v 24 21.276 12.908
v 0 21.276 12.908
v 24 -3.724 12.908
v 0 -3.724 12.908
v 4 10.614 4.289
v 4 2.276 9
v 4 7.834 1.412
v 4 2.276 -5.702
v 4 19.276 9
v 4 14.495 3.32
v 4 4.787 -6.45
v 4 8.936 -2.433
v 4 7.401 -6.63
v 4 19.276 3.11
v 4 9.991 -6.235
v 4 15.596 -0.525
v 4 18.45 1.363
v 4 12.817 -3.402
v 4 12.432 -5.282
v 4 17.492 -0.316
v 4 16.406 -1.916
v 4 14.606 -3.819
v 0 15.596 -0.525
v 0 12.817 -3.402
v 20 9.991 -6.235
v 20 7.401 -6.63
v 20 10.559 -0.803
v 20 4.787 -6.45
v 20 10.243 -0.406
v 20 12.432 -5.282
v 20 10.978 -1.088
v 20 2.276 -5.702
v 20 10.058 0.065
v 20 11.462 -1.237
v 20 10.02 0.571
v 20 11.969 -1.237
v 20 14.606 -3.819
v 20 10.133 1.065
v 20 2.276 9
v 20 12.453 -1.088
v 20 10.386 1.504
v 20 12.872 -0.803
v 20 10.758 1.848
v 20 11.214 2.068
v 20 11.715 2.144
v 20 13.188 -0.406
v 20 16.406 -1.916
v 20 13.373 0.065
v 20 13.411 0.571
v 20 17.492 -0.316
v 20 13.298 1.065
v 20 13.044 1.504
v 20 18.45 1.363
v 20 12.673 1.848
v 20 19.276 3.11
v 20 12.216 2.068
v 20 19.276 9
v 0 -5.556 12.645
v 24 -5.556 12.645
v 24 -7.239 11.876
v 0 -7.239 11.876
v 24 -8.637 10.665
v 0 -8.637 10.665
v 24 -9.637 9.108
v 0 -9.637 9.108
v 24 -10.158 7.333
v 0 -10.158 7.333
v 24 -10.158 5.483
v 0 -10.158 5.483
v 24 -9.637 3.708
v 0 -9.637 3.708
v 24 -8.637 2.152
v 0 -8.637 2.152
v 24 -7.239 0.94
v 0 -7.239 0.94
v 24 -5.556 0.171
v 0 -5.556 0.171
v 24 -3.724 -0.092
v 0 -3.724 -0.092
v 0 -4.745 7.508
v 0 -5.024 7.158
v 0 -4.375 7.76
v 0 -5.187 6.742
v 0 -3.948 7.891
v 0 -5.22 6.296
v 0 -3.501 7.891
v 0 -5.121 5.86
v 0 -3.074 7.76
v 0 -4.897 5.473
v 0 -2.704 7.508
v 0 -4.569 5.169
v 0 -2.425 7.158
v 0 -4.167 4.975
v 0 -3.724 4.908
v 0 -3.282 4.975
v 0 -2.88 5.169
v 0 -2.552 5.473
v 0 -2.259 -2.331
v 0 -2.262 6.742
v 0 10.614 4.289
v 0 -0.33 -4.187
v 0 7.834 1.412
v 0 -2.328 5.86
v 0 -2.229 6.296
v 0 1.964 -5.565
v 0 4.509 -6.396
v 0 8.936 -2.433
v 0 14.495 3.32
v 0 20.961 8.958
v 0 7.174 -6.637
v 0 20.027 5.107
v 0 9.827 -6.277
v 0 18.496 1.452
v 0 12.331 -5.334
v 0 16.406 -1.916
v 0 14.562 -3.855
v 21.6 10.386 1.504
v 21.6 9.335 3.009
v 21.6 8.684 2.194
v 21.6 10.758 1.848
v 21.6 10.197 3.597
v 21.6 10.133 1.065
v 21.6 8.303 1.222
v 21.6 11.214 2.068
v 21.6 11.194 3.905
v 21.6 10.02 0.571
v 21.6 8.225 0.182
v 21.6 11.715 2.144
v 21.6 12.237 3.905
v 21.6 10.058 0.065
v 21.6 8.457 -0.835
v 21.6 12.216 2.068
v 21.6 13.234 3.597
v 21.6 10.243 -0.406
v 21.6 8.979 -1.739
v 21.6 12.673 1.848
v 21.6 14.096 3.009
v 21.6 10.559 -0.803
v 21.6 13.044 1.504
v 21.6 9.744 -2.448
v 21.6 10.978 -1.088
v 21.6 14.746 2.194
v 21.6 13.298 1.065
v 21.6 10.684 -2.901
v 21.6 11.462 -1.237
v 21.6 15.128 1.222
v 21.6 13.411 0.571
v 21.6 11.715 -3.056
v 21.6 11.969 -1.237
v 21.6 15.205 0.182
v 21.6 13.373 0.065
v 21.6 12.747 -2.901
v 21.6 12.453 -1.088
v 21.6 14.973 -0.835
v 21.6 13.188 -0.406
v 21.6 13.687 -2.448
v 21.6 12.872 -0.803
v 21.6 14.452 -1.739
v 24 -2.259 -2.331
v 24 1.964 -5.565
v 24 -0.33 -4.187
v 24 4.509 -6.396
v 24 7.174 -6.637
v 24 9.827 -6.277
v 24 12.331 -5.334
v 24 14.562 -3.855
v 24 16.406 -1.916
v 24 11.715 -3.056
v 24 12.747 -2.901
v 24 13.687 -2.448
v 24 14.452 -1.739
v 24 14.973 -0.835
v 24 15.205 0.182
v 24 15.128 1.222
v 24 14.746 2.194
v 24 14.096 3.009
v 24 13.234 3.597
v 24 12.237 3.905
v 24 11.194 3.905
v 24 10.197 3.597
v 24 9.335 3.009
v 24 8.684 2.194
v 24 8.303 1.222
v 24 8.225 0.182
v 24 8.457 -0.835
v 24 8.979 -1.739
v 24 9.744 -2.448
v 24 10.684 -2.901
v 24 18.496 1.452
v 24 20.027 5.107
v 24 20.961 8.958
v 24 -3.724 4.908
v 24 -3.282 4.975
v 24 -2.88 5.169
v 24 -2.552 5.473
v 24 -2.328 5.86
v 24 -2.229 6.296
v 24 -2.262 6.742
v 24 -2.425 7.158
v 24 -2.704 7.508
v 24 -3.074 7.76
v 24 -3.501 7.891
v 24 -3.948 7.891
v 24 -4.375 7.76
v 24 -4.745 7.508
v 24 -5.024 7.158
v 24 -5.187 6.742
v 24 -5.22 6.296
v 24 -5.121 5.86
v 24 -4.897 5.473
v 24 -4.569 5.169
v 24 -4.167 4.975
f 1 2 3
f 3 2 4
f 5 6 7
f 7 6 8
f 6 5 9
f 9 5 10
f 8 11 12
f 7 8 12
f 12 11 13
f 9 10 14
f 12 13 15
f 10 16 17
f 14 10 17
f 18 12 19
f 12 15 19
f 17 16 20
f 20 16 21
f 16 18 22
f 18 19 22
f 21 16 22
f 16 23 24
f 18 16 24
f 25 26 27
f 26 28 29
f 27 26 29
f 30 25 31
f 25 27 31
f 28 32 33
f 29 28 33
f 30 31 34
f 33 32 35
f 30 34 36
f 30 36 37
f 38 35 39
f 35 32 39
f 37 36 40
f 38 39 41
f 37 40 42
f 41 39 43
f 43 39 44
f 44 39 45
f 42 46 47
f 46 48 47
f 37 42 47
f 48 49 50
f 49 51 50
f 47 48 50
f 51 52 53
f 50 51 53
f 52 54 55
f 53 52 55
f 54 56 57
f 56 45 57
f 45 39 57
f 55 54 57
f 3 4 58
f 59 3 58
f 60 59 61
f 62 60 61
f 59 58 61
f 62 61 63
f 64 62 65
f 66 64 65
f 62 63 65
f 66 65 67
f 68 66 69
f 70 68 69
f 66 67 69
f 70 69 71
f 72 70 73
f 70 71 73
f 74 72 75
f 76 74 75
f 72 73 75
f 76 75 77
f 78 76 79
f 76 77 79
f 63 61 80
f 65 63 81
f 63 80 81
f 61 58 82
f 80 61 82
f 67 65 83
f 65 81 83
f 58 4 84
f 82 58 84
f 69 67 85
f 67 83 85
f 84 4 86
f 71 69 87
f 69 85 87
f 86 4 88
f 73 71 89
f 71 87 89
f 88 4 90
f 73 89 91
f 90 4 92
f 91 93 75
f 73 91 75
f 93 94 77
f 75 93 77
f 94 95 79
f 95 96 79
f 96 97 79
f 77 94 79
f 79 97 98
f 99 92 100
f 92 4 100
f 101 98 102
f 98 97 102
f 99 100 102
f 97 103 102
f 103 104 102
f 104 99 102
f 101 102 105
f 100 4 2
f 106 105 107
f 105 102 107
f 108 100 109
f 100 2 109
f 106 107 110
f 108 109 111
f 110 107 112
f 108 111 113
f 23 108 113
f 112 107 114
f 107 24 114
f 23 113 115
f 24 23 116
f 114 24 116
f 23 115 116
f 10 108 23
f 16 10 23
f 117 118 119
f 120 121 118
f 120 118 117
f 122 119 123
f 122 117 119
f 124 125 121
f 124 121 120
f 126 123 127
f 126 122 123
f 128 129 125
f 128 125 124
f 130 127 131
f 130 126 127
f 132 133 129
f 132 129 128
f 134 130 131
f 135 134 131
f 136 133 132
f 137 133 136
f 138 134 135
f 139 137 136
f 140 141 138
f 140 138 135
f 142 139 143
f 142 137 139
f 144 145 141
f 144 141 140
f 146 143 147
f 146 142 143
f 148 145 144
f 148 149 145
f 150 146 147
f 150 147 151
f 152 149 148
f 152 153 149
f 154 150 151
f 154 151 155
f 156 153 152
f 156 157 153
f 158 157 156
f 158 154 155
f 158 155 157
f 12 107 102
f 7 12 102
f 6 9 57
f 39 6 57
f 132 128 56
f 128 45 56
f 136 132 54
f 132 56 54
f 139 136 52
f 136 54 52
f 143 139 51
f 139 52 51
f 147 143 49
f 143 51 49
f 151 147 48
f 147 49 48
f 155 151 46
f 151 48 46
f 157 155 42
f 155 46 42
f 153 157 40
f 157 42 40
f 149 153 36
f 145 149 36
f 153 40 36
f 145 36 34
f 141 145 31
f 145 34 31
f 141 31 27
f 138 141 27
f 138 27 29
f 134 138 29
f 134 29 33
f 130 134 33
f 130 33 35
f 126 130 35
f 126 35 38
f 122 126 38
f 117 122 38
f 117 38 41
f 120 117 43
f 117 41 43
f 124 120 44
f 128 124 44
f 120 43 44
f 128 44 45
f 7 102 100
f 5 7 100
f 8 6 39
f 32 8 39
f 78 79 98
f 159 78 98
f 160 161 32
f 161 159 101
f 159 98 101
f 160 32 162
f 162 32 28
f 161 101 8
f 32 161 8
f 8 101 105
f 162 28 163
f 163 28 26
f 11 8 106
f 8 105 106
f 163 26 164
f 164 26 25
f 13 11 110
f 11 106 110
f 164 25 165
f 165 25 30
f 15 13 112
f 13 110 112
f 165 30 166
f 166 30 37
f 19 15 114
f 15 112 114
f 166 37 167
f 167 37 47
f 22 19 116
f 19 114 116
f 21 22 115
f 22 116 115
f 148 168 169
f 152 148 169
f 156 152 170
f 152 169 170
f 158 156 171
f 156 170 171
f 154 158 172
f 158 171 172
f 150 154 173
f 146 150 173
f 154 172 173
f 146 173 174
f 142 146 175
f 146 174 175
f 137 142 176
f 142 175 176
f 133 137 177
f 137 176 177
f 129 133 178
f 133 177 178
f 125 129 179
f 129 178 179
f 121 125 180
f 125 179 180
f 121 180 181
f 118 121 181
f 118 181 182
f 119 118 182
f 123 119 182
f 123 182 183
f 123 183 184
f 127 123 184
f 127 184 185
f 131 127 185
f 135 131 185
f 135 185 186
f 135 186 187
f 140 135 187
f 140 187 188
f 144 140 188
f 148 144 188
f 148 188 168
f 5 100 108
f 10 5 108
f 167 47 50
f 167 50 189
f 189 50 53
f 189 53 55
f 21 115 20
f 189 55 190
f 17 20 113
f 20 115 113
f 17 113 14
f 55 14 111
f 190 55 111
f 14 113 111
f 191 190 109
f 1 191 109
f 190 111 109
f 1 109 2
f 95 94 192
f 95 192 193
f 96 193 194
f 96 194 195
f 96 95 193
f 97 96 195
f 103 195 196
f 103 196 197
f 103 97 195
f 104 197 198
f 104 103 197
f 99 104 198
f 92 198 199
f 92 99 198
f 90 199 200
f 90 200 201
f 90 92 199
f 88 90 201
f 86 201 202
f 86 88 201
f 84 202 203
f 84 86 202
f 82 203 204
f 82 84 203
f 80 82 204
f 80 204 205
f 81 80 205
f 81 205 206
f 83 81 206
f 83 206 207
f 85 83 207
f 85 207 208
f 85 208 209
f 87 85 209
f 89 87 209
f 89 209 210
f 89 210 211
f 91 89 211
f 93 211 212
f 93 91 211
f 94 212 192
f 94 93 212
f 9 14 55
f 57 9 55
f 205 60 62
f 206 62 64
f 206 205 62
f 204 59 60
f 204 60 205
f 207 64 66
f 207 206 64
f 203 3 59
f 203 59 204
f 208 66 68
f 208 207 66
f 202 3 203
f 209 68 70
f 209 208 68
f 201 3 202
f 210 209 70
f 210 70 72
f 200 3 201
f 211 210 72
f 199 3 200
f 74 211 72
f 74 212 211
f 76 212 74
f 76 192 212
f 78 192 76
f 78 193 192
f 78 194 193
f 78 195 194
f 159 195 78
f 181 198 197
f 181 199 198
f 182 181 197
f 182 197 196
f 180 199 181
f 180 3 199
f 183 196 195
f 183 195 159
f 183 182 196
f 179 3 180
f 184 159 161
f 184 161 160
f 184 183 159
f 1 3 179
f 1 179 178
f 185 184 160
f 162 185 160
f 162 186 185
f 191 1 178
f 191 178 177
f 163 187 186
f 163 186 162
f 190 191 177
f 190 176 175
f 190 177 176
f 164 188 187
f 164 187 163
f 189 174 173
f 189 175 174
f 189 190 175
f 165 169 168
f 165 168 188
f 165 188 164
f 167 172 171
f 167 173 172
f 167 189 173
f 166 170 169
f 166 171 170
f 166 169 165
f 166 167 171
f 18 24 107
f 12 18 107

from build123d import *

# Parameters (mm, degrees)
SZKIC5_R                                             = 1.5
DODANIE_WYCI_GNI_CIE2_DEPTH                          = 24
POG_BIENIE_WALCOWE_POD_M3_WKR_T_DO_CZ_CI_D           = 3.4
POG_BIENIE_WALCOWE_POD_M3_WKR_T_DO_CZ_CI_CBORE_D     = 7
POG_BIENIE_WALCOWE_POD_M3_WKR_T_DO_CZ_CI_CBORE_DEPTH = 2.4
SZKIC14_W                                            = 16
SZKIC14_H                                            = 17
WYTNIJ_WYCI_GNI_CIE1_DEPTH                           = 9
WYTNIJ_WYCI_GNI_CIE1_DEPTH_BACK                      = 24
WYTNIJ_WYCI_GNI_CIE2_DEPTH                           = 8


with BuildPart() as part:
    # Szkic5 → Dodanie-wyciągnięcie2 (new body)
    with BuildSketch(Plane(origin=(0, 0, 0), x_dir=(0, 0, -1), z_dir=(1, 0, 0))):
        with BuildLine():
            Line((-12.908163265, 21.275510204), (-12.908163265, -3.724489796))
            ThreePointArc((-12.908163265, -3.724489796), (-6.408163265, -10.224489796), (0.091836735, -3.724489796))
            ThreePointArc((0.091836735, -3.724489796), (6.591813696, 5.834724726), (1.9156302, 16.406460189))
            ThreePointArc((1.9156302, 16.406460189), (-5.106681022, 20.027075938), (-12.908163265, 21.275510204))
        make_face()
        with Locations((-6.408163265, -3.724489796)):
            Circle(SZKIC5_R, mode=Mode.SUBTRACT)
    extrude(amount=DODANIE_WYCI_GNI_CIE2_DEPTH)

    # Pogłębienie walcowe pod M3 wkręt do części metalowych z łbem stożkowym ściętym1 (through all)
    with Locations(Plane(origin=(24, 0, 0), x_dir=(0, 0, -1), z_dir=(1, 0, 0))):
        with Locations((-0.443639472, 11.715274148)):
            CounterBoreHole(POG_BIENIE_WALCOWE_POD_M3_WKR_T_DO_CZ_CI_D / 2, POG_BIENIE_WALCOWE_POD_M3_WKR_T_DO_CZ_CI_CBORE_D / 2, POG_BIENIE_WALCOWE_POD_M3_WKR_T_DO_CZ_CI_CBORE_DEPTH)

    # Szkic14 → Wytnij-wyciągnięcie1 (cut, two sides)
    with BuildSketch(Plane.XY) as wytnij_wyci_gni_cie1_sk:
        with Locations((12, 10.775510204)):
            Rectangle(SZKIC14_W, SZKIC14_H)
    extrude(amount=WYTNIJ_WYCI_GNI_CIE1_DEPTH, mode=Mode.SUBTRACT)
    extrude(wytnij_wyci_gni_cie1_sk.sketch, amount=-WYTNIJ_WYCI_GNI_CIE1_DEPTH_BACK, mode=Mode.SUBTRACT)

    # Szkic18 → Wytnij-wyciągnięcie2 (cut)
    with BuildSketch(Plane.ZY):
        Polygon((1.412173102, 7.834302284), (4.288926512, 10.613562944), (3.320392883, 14.494534808), (-0.524894158, 15.596246012), (-3.401647568, 12.816985352), (-2.433113939, 8.936013488), align=None)
    extrude(amount=-WYTNIJ_WYCI_GNI_CIE2_DEPTH, mode=Mode.SUBTRACT)


solid = part.part
